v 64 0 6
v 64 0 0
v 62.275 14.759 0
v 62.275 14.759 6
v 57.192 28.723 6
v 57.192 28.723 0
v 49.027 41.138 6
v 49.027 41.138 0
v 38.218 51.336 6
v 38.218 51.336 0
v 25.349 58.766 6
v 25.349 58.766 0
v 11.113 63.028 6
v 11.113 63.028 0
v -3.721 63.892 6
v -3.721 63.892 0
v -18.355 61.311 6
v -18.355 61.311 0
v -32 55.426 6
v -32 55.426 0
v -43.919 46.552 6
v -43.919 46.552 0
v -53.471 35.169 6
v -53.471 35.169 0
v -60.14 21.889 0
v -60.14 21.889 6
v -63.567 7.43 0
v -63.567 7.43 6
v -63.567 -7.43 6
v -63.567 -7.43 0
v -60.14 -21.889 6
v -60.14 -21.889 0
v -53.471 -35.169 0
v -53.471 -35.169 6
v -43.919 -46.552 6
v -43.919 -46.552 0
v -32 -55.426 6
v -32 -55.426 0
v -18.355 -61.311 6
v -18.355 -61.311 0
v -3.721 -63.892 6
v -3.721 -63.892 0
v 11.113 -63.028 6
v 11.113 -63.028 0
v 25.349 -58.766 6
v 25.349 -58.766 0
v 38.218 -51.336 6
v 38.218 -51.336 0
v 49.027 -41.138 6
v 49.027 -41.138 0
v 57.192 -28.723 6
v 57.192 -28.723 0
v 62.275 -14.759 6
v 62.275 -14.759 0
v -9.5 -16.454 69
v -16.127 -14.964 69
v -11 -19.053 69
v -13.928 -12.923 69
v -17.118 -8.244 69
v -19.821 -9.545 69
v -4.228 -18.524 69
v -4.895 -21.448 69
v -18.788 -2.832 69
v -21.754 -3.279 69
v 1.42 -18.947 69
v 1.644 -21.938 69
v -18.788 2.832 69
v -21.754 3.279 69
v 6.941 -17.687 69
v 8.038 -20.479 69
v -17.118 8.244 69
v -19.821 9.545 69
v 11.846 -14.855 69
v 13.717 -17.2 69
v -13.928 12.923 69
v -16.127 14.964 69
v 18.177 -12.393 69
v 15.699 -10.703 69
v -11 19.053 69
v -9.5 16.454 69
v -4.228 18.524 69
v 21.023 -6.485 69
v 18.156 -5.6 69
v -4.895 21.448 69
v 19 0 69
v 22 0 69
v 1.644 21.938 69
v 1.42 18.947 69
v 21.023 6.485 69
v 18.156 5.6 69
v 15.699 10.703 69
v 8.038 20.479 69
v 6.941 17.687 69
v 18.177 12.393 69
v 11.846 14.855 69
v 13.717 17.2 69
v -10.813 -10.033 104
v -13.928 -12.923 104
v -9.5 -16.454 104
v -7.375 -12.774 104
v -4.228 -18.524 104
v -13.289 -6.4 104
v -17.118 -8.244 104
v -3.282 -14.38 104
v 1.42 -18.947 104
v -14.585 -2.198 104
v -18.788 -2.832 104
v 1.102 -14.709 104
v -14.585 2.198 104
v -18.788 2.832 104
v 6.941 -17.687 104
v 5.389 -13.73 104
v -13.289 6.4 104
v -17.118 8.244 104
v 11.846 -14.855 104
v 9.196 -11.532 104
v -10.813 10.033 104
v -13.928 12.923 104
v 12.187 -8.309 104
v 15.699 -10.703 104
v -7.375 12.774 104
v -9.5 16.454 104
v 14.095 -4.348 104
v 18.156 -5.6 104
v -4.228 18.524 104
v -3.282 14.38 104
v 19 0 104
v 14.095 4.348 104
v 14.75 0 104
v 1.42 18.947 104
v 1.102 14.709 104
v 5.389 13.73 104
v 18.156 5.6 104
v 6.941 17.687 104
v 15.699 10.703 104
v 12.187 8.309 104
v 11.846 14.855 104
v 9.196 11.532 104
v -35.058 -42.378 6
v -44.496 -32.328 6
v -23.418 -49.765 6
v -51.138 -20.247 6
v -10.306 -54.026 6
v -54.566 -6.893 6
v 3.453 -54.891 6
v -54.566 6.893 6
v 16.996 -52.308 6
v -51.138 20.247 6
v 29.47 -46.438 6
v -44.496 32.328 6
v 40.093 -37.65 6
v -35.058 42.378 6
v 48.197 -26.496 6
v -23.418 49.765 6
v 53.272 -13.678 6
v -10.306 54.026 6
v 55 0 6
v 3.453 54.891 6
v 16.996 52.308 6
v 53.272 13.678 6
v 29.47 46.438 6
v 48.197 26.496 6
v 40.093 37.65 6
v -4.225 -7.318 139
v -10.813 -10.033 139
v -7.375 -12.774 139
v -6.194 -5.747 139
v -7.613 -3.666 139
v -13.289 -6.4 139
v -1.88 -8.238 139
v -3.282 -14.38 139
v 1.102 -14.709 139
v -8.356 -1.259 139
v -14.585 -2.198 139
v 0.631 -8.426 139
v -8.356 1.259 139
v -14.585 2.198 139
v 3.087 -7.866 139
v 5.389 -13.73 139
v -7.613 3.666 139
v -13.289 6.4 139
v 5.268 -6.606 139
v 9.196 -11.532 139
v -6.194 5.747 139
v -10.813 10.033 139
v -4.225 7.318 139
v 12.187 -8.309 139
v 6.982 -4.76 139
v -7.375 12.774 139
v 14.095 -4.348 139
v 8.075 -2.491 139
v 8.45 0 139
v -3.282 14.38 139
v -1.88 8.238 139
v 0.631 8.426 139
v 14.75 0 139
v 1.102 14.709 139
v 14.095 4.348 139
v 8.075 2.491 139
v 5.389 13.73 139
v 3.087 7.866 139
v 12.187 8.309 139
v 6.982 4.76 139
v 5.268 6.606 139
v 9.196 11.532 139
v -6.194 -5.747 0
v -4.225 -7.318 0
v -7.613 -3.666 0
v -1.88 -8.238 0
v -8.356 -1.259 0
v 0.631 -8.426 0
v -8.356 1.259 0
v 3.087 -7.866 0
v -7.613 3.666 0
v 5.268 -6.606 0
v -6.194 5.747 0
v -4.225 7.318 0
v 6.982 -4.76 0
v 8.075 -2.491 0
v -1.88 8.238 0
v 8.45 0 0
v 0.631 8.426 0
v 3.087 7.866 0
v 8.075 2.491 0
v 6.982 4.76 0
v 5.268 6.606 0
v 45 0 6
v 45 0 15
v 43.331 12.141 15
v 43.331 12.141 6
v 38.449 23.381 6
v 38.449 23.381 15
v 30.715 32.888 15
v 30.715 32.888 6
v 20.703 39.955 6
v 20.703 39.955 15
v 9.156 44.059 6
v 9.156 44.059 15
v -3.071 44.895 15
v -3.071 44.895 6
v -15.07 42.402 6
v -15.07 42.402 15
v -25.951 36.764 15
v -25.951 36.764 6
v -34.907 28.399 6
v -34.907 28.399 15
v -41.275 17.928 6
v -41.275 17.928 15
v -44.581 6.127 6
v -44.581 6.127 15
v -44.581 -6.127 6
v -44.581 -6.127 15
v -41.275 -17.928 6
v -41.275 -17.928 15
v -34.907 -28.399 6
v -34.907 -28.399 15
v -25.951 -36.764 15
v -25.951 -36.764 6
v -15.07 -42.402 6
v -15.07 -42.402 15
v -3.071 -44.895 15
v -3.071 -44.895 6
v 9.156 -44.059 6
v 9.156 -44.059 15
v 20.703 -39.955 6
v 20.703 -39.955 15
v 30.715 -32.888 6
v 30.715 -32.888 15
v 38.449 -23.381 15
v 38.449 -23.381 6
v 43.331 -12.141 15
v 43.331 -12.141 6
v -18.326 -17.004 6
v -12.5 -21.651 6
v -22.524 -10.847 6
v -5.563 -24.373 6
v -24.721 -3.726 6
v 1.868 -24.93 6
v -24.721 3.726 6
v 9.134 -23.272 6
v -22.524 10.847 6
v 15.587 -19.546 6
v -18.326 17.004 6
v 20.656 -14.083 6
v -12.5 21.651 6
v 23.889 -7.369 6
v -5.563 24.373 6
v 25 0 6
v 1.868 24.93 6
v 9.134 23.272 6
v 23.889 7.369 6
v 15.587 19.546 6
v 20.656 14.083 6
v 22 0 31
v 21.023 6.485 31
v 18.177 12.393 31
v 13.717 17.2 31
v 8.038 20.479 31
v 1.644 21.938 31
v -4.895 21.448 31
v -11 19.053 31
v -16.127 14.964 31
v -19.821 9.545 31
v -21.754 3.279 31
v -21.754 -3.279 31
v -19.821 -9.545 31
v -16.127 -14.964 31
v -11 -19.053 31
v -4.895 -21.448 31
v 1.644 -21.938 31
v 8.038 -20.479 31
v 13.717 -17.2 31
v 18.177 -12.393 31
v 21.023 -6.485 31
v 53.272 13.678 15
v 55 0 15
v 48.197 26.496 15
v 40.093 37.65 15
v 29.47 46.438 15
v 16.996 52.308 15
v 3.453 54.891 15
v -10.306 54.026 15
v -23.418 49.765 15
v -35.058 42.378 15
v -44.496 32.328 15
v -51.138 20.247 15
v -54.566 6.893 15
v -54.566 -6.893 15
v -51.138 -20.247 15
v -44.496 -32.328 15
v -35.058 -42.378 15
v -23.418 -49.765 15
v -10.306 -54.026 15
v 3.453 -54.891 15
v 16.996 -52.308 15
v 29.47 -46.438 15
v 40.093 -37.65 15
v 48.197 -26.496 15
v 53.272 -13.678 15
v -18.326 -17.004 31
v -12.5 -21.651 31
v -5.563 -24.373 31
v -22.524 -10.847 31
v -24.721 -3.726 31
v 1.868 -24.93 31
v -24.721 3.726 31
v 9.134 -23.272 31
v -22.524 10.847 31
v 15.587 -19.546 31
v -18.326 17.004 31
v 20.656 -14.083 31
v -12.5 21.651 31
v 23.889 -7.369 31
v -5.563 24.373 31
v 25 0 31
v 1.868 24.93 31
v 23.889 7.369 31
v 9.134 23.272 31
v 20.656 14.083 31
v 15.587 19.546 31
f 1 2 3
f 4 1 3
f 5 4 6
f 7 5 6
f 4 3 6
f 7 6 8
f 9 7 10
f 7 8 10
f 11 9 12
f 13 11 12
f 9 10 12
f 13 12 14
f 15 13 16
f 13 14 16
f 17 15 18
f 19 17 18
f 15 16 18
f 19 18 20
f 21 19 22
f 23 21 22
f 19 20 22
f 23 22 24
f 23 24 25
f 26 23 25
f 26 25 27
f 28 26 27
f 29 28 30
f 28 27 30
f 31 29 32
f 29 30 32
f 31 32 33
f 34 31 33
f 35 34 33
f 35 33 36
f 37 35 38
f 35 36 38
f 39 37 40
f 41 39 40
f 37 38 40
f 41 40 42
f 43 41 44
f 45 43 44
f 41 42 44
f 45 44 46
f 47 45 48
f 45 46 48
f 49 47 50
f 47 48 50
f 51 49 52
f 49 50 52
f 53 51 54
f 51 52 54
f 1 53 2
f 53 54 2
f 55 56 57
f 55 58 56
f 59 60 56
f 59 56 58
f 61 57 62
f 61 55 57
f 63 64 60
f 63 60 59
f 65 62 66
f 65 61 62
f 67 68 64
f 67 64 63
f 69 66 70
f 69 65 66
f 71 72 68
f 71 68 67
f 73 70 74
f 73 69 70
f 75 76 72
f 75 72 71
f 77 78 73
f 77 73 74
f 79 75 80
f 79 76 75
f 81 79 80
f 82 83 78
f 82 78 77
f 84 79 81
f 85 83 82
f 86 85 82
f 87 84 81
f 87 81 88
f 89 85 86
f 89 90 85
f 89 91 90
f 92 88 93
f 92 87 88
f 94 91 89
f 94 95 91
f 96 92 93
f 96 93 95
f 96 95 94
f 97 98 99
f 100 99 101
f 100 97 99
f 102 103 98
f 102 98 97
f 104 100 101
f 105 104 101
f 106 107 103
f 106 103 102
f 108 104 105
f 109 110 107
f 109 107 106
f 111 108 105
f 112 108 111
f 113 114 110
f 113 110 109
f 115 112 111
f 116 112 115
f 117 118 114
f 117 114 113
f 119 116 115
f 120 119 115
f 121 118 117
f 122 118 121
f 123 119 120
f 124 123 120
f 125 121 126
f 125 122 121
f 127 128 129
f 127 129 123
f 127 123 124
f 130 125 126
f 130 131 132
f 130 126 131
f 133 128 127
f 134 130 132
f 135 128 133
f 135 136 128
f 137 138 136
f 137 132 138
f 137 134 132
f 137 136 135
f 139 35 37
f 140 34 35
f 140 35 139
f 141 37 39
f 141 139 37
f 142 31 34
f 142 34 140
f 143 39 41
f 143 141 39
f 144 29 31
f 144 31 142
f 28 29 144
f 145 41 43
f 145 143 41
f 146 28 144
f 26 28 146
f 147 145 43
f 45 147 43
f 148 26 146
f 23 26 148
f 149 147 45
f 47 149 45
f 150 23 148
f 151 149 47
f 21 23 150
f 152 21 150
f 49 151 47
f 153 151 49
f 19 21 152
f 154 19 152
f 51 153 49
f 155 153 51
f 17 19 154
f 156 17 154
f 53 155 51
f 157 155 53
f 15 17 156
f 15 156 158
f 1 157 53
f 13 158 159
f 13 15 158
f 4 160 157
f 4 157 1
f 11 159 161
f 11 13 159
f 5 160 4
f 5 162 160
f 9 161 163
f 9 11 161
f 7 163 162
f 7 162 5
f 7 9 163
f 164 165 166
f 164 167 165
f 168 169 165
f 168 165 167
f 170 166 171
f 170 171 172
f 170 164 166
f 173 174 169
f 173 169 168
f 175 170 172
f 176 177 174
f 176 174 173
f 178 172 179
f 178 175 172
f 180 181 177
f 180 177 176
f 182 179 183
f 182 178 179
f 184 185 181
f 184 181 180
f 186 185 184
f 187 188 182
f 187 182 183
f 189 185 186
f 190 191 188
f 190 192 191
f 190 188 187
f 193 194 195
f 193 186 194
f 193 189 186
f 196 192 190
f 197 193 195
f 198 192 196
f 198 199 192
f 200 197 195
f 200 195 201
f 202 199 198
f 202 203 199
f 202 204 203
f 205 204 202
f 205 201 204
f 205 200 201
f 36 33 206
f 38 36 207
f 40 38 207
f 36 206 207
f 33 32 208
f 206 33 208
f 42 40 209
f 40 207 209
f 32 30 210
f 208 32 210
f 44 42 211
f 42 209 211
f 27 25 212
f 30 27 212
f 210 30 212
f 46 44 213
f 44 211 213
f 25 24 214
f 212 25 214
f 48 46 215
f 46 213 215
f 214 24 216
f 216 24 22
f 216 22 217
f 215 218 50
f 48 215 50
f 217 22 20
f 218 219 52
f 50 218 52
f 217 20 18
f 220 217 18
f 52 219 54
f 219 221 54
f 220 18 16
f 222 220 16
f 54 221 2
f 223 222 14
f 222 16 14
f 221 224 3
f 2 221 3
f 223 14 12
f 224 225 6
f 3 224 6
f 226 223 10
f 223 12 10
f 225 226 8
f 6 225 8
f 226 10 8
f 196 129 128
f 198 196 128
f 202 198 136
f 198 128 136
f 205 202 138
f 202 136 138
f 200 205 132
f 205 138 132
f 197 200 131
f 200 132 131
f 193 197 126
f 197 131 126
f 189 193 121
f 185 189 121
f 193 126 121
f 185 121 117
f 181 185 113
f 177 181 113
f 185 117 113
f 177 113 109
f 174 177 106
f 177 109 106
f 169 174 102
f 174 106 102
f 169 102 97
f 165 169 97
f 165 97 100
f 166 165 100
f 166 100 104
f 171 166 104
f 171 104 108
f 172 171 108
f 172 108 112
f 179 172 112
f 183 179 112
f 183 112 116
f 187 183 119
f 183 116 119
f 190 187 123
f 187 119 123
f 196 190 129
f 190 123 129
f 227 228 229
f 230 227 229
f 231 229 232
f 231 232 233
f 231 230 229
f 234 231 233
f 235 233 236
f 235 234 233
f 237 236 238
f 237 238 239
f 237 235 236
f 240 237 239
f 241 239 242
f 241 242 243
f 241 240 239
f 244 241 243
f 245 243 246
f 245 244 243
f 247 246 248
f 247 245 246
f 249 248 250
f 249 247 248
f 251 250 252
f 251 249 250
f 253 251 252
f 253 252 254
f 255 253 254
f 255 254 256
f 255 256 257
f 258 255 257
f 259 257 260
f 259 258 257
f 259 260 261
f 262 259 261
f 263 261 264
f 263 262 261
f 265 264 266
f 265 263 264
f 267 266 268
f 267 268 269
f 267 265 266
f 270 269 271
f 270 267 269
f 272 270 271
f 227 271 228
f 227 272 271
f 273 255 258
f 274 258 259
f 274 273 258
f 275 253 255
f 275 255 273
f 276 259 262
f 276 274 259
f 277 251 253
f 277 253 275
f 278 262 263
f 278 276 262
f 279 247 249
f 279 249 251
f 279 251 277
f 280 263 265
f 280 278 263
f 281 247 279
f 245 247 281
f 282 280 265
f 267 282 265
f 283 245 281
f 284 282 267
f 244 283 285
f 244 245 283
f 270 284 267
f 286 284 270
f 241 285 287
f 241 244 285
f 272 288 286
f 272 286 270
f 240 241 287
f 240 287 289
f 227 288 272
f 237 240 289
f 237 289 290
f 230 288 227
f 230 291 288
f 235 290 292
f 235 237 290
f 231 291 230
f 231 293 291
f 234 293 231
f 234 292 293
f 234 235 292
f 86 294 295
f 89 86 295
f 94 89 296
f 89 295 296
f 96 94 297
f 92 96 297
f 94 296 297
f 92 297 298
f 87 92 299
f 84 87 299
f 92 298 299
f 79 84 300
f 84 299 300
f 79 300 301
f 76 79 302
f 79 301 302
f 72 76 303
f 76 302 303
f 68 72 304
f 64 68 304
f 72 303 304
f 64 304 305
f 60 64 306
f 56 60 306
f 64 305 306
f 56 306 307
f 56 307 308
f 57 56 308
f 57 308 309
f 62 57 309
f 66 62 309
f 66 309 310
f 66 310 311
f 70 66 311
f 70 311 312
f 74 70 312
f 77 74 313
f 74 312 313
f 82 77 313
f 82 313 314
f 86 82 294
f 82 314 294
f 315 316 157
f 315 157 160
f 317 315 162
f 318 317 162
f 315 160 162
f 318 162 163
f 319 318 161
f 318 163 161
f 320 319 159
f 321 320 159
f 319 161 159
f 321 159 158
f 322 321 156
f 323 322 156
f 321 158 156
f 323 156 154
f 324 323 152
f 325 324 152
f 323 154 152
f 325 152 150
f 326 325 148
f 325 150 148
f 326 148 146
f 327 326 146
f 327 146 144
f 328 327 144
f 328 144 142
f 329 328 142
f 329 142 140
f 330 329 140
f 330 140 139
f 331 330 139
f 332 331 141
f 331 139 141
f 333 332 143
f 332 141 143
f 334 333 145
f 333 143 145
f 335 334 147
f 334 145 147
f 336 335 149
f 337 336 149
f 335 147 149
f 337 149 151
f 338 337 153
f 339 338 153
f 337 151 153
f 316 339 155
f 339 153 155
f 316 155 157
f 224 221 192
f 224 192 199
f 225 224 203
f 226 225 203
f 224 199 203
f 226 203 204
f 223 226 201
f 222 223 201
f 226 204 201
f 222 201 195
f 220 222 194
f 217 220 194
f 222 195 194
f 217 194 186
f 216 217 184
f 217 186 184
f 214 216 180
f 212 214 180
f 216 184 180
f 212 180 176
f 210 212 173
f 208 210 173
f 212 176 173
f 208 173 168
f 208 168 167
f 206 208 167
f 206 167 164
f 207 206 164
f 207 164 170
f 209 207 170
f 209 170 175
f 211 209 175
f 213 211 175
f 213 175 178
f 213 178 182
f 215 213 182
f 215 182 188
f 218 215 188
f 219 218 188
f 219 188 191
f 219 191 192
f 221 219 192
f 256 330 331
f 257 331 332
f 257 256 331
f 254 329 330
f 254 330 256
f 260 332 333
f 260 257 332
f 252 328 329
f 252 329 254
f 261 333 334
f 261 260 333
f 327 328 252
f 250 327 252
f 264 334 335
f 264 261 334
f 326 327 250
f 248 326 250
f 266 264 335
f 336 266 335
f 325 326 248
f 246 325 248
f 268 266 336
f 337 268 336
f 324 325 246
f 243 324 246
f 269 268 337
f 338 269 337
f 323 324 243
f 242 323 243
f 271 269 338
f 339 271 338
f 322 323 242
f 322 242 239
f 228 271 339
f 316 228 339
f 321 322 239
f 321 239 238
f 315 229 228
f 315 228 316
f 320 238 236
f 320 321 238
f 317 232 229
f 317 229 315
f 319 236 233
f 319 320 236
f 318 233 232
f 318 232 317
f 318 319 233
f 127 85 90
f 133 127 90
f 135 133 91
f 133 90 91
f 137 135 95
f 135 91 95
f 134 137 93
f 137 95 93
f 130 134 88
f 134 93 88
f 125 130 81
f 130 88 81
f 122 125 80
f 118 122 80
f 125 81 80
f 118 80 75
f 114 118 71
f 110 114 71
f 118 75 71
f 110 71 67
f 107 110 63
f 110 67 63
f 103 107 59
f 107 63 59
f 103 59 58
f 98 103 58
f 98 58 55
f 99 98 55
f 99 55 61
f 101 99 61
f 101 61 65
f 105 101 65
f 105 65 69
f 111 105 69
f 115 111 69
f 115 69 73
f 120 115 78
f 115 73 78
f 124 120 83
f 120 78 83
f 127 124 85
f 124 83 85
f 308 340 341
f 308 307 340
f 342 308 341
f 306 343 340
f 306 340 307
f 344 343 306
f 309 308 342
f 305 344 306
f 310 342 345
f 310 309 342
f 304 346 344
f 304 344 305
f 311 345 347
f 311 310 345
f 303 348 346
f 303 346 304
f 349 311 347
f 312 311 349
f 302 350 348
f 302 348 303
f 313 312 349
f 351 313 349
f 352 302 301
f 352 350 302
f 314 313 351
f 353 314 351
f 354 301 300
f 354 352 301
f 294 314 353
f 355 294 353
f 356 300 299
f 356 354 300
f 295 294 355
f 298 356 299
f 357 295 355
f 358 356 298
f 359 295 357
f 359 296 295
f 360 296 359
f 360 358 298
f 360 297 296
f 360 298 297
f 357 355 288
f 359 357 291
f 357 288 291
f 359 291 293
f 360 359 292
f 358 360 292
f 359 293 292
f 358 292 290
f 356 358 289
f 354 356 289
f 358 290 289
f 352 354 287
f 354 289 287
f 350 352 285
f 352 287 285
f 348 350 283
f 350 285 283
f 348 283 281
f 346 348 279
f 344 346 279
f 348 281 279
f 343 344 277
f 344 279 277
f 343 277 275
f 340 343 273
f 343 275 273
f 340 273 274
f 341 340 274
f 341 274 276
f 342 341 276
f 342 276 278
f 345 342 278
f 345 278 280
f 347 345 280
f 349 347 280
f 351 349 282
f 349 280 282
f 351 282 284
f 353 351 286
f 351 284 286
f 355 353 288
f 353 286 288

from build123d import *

# Parameters (mm, degrees)
F0_R      = 64
F0_R_2    = 55
F1_DEPTH  = 6
F2_R      = 55
F2_R_2    = 45
F3_DEPTH  = 9
F4_R      = 25
F5_DEPTH  = 25
F6_R      = 22
F7_DEPTH  = 38
F8_R      = 19
F9_DEPTH  = 35
F10_R     = 14.75
F11_DEPTH = 35
F12_R     = 8.45
F13_DEPTH = 200


with BuildPart() as f1:
    # F0 (on Top) → F1 (new body)
    with BuildSketch(Plane.XY):
        Circle(F0_R)
        Circle(F0_R_2, mode=Mode.SUBTRACT)
        Circle(F0_R_2)
    extrude(amount=F1_DEPTH)

    # F2 (on face) → F3 (join)
    with BuildSketch(Plane.XY.offset(6)):
        Circle(F2_R)
        Circle(F2_R_2, mode=Mode.SUBTRACT)
    extrude(amount=F3_DEPTH)

    # F4 (on face) → F5 (join)
    with BuildSketch(Plane.XY.offset(6)):
        Circle(F4_R)
    extrude(amount=F5_DEPTH)

    # F6 (on face) → F7 (join)
    with BuildSketch(Plane.XY.offset(31)):
        Circle(F6_R)
    extrude(amount=F7_DEPTH)

    # F8 (on face) → F9 (join)
    with BuildSketch(Plane.XY.offset(69)):
        Circle(F8_R)
    extrude(amount=F9_DEPTH)

    # F10 (on face) → F11 (join)
    with BuildSketch(Plane.XY.offset(104)):
        Circle(F10_R)
    extrude(amount=F11_DEPTH)

    # F12 (on face) → F13 (cut)
    with BuildSketch(Plane.XY.offset(139)):
        Circle(F12_R)
    extrude(amount=-F13_DEPTH, mode=Mode.SUBTRACT)


solid = f1.part
